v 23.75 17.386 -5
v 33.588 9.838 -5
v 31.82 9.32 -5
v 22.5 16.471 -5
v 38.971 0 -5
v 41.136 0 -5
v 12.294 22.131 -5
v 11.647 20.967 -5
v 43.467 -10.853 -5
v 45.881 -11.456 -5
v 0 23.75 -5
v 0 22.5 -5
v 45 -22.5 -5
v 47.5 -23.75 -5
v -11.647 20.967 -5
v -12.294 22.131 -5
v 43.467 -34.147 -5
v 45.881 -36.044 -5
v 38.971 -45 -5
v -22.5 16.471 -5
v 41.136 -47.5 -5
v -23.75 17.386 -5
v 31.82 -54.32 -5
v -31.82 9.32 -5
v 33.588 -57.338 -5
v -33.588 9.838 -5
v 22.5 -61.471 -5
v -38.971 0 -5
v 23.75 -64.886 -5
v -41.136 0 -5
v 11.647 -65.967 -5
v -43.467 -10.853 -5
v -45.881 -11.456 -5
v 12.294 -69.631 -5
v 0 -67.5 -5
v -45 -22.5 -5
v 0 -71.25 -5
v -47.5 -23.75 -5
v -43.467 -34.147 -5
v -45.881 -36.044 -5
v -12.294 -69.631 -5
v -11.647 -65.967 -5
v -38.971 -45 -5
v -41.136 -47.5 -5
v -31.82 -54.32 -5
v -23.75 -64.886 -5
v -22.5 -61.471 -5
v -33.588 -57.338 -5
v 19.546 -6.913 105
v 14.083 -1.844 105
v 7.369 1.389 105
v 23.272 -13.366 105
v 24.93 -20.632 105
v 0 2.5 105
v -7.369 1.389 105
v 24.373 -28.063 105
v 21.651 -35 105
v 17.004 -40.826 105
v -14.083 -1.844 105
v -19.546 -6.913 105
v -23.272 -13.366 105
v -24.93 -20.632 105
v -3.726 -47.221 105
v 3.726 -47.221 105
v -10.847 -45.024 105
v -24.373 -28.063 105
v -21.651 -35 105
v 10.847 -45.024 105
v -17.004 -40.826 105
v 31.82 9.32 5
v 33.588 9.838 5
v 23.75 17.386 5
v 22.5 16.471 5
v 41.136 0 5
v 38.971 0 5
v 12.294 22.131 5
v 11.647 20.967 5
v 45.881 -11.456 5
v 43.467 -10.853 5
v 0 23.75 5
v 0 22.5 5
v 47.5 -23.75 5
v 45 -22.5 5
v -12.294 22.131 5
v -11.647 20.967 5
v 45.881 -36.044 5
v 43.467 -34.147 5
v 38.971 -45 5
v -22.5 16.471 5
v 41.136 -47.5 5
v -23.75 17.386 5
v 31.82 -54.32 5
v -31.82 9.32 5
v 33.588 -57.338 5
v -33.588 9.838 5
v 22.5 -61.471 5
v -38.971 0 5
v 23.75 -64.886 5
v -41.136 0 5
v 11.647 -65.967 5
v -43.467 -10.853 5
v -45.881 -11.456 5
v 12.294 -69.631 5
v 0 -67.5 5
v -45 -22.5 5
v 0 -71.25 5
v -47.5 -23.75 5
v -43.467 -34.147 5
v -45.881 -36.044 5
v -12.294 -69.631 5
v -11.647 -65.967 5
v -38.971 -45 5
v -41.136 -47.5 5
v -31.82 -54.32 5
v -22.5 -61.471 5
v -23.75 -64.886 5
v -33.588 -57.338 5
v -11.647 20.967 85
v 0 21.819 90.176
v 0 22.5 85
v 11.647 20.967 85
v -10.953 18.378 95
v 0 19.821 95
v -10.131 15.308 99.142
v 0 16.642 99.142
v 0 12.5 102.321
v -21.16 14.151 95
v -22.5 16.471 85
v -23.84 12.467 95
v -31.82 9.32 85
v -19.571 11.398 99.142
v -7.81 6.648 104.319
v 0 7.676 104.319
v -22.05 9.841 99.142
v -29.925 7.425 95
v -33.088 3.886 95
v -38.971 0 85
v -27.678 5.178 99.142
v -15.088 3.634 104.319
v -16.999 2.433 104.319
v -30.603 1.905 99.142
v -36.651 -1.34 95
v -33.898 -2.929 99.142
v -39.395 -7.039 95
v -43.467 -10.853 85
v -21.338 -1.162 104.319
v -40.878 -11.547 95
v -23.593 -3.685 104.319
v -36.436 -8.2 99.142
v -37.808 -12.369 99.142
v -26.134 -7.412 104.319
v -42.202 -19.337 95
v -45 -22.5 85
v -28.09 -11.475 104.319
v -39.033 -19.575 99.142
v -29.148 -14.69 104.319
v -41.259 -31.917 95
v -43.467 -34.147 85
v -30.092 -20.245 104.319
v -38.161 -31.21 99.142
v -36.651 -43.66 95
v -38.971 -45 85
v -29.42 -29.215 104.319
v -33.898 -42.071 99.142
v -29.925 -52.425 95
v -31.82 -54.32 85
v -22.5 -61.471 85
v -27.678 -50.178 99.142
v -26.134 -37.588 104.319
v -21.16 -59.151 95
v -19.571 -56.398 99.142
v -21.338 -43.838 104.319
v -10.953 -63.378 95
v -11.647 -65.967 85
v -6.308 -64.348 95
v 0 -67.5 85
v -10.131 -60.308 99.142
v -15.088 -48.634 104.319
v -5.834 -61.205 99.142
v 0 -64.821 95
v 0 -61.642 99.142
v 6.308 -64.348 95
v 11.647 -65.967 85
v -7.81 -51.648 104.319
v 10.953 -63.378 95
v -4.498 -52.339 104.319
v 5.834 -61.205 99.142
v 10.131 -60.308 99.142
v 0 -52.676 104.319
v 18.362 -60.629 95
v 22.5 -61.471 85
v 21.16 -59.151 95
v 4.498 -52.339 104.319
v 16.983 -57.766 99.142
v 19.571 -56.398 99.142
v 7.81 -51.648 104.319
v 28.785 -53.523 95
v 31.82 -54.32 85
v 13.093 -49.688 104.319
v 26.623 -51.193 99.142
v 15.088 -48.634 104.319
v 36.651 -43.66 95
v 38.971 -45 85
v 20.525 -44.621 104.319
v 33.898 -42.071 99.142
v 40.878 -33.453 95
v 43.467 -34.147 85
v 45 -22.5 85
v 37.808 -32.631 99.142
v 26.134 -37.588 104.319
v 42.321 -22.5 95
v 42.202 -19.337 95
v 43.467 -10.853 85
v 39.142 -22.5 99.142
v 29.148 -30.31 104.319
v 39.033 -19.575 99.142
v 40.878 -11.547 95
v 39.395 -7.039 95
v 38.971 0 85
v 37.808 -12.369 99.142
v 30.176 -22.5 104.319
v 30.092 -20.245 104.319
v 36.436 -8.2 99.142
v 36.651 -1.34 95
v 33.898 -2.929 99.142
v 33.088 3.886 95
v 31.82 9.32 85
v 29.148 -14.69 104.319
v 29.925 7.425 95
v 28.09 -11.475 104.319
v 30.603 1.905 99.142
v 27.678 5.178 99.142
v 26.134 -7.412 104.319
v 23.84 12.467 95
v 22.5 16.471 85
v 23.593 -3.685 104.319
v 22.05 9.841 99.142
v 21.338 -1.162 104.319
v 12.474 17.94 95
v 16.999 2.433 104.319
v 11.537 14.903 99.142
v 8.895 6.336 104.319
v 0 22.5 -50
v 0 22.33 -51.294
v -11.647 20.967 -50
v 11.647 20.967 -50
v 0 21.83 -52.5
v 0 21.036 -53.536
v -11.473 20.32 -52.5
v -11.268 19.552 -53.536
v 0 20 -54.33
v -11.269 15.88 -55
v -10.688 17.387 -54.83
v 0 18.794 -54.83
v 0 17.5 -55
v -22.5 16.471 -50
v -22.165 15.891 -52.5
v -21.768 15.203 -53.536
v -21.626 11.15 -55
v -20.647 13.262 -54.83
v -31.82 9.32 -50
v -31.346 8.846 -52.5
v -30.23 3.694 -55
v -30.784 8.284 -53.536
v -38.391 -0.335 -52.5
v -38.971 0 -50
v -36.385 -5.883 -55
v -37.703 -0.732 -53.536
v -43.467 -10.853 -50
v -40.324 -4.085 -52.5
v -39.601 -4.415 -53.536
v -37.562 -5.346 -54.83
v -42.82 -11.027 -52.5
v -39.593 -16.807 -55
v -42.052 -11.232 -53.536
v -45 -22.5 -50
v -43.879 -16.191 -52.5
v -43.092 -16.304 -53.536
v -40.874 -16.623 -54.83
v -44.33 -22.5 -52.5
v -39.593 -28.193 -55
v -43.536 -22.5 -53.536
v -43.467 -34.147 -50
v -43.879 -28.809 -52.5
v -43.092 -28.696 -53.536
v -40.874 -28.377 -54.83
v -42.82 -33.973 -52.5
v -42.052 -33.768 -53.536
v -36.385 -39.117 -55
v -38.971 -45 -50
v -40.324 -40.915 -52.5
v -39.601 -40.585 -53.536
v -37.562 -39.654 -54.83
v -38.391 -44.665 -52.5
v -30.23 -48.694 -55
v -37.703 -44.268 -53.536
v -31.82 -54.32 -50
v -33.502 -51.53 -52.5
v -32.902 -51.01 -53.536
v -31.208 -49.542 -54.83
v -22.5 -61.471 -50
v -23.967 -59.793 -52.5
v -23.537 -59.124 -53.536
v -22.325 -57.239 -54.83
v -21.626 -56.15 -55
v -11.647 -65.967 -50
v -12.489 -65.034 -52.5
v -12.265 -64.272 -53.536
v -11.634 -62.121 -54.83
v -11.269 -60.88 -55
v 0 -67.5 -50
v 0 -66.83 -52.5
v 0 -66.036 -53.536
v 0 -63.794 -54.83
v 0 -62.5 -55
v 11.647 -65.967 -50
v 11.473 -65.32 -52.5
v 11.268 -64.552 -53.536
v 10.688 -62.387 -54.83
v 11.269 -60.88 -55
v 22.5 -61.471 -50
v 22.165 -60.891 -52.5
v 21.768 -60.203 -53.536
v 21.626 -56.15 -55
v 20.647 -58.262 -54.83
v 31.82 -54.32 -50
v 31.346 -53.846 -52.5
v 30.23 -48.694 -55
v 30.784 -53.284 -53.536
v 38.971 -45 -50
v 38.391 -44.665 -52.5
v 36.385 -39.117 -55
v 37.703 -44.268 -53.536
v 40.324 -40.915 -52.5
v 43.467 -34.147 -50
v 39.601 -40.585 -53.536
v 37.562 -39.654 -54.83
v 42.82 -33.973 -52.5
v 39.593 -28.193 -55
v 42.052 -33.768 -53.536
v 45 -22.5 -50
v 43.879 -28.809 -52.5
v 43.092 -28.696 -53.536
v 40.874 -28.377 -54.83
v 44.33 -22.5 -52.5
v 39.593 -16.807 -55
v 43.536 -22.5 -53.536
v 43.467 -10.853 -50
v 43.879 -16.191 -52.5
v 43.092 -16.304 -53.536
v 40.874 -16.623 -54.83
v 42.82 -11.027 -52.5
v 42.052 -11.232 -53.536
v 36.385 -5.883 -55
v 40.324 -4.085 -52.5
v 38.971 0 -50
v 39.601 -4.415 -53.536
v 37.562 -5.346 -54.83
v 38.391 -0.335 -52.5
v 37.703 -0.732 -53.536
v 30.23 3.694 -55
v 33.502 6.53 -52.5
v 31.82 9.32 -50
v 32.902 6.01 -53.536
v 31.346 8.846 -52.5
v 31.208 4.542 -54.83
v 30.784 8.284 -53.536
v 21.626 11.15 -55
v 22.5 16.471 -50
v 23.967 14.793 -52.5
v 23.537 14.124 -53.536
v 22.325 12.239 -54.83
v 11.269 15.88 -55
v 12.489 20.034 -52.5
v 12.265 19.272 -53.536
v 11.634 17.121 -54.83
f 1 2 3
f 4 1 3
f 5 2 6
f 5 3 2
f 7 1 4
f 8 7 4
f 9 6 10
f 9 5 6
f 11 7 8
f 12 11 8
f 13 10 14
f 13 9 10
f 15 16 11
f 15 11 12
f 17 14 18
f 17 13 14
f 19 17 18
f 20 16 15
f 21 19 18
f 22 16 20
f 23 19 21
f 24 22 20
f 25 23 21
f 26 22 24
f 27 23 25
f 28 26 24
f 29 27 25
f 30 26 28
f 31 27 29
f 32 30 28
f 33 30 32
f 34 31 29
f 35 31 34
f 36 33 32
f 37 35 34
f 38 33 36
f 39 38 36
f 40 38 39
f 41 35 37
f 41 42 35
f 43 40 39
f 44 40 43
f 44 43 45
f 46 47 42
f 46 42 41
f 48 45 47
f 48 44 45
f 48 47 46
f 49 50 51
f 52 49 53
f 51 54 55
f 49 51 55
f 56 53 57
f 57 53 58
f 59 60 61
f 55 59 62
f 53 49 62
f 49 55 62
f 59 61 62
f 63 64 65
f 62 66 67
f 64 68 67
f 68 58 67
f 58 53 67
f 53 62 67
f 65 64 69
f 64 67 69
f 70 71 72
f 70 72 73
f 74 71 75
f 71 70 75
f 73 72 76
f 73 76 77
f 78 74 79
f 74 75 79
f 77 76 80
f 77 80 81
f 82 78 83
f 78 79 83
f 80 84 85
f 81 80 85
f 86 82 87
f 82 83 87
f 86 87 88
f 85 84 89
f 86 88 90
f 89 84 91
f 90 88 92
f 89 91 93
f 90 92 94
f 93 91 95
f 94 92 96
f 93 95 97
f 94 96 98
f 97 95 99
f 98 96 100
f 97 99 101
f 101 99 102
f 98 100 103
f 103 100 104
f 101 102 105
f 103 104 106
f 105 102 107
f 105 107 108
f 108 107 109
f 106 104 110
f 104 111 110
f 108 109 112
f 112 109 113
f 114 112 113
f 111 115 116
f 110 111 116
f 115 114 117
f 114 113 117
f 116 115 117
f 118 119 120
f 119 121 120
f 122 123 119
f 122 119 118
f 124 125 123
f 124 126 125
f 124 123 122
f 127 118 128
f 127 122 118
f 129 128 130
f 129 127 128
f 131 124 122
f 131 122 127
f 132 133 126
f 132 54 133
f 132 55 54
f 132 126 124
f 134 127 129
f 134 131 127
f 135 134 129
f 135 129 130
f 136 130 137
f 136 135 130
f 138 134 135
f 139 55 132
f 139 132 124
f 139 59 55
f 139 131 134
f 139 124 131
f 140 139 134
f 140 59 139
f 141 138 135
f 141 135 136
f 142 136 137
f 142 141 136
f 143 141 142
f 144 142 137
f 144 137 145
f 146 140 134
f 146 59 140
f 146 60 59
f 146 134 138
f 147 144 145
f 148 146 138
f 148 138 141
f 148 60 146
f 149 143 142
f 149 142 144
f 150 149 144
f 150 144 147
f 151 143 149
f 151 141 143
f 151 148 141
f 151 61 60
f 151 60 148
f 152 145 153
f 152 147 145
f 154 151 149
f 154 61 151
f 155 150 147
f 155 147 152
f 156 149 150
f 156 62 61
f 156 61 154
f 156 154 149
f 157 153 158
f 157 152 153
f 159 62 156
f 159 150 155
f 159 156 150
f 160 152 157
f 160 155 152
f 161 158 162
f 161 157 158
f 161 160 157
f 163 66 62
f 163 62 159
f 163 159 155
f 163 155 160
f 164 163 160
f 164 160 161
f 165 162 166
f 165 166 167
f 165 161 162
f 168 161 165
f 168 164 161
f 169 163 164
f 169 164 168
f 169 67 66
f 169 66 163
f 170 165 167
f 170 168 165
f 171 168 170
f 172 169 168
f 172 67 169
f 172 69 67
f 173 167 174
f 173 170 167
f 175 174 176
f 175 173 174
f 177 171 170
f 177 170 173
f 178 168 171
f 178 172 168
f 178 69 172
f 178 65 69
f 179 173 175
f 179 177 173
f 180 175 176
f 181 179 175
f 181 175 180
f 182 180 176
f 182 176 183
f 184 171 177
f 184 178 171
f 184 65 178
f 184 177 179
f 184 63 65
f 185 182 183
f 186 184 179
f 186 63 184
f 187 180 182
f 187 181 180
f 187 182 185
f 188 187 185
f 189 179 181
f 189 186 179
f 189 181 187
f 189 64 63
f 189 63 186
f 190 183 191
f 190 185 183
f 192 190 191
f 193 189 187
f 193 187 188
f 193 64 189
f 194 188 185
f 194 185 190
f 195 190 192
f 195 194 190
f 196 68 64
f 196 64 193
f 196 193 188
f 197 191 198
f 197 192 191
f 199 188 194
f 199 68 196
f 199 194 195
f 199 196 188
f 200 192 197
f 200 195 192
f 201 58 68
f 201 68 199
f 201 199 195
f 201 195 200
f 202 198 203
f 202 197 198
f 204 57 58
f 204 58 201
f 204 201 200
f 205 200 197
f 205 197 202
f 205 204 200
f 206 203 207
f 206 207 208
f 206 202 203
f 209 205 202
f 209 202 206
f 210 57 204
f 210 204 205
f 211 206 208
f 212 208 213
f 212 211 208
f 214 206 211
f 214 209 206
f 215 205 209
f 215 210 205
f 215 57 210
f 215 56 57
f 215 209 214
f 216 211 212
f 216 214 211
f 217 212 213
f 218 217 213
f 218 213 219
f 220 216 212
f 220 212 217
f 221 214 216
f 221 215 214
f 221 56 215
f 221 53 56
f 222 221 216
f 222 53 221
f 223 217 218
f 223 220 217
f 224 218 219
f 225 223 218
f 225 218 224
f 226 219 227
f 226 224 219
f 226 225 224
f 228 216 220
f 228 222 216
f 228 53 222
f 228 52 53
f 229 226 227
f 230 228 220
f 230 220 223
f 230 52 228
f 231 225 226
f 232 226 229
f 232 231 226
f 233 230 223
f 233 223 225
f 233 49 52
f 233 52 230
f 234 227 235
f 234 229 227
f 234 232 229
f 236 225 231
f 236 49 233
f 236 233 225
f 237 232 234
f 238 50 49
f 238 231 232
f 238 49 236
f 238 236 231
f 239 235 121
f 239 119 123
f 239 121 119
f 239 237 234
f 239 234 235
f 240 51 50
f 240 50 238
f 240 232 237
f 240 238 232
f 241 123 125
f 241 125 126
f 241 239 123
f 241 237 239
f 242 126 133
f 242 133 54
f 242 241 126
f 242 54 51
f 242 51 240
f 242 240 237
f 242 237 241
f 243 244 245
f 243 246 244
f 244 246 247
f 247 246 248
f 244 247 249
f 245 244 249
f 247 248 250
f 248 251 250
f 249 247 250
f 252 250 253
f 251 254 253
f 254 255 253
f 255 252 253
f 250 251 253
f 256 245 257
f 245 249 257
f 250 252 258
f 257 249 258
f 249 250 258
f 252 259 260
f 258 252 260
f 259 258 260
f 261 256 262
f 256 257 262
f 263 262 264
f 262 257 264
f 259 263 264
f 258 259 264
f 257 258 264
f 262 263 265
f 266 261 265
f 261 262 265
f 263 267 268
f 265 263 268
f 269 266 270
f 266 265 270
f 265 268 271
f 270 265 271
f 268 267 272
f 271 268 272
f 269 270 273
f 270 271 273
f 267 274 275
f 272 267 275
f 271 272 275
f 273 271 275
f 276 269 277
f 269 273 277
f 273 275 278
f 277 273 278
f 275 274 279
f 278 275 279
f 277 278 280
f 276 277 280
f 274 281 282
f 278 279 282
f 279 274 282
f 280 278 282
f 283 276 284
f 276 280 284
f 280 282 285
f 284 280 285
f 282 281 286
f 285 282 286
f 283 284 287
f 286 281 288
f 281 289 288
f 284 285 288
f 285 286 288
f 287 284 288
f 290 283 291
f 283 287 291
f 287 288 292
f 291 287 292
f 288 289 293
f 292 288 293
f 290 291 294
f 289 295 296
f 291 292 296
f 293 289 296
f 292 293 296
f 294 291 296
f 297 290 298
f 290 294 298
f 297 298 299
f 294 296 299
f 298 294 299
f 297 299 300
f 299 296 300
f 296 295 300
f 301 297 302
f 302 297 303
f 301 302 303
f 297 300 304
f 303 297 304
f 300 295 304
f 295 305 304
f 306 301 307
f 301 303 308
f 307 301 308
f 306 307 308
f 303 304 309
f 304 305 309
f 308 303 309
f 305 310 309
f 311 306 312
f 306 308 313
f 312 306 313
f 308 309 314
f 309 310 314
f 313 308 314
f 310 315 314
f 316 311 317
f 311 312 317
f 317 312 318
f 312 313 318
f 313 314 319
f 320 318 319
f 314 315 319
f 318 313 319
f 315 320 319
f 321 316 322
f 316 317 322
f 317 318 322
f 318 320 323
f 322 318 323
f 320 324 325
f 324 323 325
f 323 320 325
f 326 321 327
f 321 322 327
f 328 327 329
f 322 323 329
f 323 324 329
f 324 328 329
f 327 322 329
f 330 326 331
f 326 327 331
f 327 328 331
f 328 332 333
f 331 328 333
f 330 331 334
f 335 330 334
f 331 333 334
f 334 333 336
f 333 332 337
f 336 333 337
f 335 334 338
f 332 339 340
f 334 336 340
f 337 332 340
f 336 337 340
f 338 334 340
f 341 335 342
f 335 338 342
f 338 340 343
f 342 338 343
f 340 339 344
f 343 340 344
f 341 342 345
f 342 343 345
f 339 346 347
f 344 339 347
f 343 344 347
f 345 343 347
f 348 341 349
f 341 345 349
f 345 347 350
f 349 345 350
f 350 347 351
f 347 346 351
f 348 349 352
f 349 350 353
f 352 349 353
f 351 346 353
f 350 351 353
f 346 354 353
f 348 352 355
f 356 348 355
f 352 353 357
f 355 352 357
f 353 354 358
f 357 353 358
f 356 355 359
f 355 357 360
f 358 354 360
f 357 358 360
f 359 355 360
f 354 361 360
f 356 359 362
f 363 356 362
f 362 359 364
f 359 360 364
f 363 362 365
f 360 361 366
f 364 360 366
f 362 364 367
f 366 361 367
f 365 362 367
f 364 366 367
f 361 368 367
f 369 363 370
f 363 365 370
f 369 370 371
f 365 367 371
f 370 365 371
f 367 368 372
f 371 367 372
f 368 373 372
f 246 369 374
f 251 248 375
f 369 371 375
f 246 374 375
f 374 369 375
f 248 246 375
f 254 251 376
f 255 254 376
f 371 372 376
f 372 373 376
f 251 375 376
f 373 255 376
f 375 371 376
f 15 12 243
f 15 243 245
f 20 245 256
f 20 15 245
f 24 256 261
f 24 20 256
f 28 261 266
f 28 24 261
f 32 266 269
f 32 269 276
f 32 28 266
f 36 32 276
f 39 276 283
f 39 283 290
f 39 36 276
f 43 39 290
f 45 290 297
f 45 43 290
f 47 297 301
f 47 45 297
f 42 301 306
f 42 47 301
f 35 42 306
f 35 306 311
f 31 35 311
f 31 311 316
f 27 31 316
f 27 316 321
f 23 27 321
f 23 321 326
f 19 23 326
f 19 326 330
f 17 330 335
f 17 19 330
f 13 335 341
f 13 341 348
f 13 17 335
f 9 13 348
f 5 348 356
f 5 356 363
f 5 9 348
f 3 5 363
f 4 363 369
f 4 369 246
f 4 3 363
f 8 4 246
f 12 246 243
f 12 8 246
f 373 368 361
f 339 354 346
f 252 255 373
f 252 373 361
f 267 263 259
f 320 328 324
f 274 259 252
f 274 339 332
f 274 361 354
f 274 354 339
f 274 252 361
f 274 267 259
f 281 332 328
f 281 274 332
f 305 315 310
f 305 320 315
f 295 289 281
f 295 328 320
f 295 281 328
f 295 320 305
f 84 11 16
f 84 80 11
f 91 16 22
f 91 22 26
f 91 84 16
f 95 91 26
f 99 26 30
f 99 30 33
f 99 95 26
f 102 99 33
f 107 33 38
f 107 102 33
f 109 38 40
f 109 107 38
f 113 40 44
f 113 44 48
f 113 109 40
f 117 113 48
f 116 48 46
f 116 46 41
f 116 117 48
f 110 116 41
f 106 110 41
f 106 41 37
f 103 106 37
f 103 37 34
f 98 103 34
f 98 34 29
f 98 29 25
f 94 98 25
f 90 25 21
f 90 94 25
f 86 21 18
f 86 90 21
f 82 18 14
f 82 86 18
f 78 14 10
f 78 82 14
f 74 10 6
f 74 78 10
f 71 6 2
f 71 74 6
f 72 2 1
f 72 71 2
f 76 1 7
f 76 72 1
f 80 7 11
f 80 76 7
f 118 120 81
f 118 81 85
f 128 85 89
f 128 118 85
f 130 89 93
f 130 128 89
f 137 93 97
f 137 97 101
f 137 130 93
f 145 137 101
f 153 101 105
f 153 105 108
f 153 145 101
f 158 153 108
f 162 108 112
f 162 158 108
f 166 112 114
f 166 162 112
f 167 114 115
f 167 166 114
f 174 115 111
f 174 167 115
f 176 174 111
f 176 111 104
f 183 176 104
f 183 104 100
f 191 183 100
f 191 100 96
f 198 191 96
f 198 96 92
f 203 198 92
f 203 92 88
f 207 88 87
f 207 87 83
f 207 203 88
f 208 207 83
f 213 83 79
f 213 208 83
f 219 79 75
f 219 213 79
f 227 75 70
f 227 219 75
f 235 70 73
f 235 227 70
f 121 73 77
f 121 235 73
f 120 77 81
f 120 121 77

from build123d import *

# Parameters (mm, degrees)
SKETCH1_W   = 45
SKETCH1_H   = 100
SKETCH1_7_W = 45
SKETCH1_7_H = 50
FILLET1_R   = 20
FILLET2_R   = 5


with BuildPart() as part:
    # Sketch1 → Revolve2 (revolve)
    with BuildSketch(Plane.YZ):
        with Locations((0, 55)):
            Rectangle(SKETCH1_W, SKETCH1_H)
    revolve(axis=Axis((0, -22.5, 5), (0, 0, 1)))

    # Sketch1<6> → Revolve3 (revolve)
    with BuildSketch(Plane.YZ):
        Polygon((-23.75, 5), (-23.75, -5), (-22.5, -5), (22.5, -5), (23.75, -5), (23.75, 5), (22.5, 5), (-22.5, 5), align=None)
    revolve(axis=Axis((0, -23.75, -5), (0, 0, 1)))

    # Sketch1<7> → Revolve4 (revolve)
    with BuildSketch(Plane.YZ):
        with Locations((0, -30)):
            Rectangle(SKETCH1_7_W, SKETCH1_7_H)
    revolve(axis=Axis((0, -22.5, -55), (0, 0, 1)))

    # Fillet1
    fillet1_edges = [part.edges().sort_by_distance(p)[0] for p in [
        (0, -67.5, 105),
    ]]
    fillet(fillet1_edges, radius=FILLET1_R)

    # Fillet2
    fillet2_edges = [part.edges().sort_by_distance(p)[0] for p in [
        (0, -67.5, -55),
    ]]
    fillet(fillet2_edges, radius=FILLET2_R)


solid = part.part
